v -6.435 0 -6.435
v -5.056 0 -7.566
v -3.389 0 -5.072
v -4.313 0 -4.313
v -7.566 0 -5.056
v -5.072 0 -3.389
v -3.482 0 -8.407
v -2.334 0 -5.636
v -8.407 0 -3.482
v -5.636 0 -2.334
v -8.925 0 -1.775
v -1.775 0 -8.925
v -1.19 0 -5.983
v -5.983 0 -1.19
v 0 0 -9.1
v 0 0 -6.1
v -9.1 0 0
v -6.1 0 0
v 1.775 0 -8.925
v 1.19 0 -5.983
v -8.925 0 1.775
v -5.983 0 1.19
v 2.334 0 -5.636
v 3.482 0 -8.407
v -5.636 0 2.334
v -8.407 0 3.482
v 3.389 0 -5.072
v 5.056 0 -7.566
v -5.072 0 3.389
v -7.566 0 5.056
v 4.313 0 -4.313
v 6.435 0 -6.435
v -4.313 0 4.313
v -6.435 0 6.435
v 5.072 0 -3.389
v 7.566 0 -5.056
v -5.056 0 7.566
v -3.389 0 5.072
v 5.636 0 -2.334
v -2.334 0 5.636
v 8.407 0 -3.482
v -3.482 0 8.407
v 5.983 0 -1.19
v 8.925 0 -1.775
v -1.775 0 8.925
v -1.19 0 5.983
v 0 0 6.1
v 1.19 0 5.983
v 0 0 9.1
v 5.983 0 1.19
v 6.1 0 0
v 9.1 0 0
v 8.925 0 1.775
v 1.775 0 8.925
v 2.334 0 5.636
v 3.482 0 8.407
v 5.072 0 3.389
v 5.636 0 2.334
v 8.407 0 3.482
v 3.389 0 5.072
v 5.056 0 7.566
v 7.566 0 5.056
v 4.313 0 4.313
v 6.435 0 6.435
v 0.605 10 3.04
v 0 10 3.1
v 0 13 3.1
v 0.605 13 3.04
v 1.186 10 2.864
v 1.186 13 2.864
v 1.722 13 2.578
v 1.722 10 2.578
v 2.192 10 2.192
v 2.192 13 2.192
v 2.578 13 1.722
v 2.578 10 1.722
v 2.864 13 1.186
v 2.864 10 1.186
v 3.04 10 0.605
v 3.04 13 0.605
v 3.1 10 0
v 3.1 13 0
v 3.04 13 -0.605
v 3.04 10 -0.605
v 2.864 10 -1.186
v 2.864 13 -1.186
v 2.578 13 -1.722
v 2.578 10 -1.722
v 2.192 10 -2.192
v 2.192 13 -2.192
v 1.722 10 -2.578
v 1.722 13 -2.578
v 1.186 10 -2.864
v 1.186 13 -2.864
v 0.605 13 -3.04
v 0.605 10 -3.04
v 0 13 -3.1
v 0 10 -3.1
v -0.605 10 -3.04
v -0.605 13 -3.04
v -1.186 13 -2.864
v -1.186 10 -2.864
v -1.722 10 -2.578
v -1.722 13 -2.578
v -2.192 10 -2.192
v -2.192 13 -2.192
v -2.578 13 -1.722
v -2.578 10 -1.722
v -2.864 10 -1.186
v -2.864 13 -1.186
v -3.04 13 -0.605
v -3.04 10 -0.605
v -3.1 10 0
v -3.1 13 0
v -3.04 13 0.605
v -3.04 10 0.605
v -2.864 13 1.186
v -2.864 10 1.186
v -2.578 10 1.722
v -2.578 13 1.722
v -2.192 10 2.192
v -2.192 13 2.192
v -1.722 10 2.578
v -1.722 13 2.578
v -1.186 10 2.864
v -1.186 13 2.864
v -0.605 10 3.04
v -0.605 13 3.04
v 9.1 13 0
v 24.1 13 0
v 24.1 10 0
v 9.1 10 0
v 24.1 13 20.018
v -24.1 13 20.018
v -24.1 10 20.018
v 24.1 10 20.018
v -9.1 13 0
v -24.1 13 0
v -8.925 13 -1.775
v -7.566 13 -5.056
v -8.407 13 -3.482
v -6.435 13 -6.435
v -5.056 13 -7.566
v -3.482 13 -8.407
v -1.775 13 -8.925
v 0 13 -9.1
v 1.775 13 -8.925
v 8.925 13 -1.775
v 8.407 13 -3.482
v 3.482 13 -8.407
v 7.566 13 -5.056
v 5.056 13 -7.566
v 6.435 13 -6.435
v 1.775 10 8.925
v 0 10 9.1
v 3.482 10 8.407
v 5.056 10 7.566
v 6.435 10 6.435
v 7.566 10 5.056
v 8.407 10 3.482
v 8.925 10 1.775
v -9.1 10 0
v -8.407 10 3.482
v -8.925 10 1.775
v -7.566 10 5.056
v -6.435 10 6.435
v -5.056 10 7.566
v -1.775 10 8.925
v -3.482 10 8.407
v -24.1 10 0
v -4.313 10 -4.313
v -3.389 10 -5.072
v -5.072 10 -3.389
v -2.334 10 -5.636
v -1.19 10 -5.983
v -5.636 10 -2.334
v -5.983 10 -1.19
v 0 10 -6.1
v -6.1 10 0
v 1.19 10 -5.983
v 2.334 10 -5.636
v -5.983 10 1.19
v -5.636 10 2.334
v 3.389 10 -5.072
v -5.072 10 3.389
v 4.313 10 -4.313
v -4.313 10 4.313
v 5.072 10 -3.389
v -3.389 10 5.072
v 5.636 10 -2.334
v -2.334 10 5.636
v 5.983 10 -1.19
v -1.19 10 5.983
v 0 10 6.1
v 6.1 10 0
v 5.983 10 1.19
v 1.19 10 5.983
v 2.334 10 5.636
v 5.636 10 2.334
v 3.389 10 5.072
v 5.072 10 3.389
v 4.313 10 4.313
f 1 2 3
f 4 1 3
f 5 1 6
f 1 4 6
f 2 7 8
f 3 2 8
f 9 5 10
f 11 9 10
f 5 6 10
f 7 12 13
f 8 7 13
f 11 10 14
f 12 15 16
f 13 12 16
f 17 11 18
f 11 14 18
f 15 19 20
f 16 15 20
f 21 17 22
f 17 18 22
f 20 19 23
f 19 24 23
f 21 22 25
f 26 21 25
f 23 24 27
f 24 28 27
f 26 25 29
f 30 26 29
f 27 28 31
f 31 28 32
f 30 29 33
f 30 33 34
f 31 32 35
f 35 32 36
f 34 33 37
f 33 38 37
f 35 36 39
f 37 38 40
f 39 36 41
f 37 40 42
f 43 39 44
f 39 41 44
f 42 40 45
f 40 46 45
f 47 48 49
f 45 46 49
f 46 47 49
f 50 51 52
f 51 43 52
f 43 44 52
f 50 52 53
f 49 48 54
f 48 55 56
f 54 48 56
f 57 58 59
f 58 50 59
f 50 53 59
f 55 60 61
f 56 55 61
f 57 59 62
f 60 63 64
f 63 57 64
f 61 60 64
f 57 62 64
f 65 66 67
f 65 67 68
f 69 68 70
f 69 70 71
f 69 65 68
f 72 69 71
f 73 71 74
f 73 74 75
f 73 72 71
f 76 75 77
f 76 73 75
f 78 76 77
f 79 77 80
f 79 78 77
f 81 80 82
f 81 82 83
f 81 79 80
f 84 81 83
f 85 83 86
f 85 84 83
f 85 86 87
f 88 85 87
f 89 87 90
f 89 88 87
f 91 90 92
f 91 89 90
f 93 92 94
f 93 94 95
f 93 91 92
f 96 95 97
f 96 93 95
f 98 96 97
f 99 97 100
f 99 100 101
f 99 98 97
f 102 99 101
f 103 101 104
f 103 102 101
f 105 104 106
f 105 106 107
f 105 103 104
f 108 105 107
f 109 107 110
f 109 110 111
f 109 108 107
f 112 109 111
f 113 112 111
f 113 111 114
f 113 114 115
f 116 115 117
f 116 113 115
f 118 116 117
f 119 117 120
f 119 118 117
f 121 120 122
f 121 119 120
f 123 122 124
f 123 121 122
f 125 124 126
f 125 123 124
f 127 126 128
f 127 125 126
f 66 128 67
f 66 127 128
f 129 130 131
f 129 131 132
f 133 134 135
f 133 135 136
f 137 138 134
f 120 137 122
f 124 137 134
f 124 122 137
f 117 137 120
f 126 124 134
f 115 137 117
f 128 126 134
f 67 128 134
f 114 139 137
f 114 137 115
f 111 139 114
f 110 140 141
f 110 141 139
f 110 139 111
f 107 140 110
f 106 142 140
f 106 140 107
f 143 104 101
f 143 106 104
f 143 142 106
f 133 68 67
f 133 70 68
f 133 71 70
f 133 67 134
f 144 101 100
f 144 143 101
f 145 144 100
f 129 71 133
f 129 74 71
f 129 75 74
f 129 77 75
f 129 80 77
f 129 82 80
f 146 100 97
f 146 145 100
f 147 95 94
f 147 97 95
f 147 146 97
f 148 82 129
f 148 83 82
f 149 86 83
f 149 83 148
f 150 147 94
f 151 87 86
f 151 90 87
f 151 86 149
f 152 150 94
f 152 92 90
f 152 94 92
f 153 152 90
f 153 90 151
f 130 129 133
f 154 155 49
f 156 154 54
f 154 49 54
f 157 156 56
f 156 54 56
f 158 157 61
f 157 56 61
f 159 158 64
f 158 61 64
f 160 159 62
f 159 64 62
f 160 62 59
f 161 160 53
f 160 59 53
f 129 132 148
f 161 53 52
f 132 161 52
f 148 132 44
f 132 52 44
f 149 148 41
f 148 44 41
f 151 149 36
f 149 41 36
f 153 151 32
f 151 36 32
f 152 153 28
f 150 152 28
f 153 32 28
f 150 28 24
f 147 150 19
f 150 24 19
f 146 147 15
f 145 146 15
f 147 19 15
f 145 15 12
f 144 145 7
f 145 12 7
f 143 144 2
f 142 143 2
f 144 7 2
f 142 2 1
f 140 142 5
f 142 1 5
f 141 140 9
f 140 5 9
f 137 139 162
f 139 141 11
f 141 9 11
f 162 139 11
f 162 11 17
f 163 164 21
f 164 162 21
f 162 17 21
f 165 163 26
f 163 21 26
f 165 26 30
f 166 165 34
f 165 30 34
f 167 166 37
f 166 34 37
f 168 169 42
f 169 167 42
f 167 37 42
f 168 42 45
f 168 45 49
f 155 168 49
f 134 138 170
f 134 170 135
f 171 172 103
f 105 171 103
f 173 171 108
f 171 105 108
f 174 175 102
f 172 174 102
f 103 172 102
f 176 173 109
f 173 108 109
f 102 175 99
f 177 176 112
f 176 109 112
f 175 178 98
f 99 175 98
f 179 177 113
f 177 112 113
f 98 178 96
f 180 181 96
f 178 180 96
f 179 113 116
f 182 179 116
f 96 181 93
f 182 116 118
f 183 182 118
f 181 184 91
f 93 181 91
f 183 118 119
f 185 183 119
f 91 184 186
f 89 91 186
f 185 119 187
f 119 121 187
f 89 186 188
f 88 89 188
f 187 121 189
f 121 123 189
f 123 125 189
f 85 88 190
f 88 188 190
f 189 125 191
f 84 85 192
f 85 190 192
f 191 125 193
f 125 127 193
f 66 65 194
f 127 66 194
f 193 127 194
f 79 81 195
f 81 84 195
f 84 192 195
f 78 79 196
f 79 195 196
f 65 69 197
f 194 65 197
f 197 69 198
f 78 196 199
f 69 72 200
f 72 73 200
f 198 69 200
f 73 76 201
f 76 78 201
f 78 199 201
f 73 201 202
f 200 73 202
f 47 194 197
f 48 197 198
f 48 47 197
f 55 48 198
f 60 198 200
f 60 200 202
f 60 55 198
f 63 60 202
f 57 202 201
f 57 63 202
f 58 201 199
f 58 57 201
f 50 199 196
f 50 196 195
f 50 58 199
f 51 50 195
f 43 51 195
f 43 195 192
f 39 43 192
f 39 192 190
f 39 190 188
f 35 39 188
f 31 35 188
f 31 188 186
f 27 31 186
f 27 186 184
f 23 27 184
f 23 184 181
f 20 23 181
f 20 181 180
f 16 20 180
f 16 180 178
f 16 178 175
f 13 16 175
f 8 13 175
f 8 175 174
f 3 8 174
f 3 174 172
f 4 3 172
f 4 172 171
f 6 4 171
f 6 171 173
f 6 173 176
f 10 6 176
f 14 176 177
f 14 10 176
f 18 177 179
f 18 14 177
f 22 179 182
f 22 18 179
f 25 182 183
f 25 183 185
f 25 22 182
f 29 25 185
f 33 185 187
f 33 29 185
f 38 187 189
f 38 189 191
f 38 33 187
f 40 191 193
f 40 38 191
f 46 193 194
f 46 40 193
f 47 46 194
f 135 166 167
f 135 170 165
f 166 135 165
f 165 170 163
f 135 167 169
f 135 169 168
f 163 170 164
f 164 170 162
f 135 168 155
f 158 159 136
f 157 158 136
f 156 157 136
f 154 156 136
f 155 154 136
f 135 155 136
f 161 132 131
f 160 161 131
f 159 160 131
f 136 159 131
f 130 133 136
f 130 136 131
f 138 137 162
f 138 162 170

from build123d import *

# Parameters (mm, degrees)
SKETCH1_R           = 9.1
SKETCH1_R_2         = 6.1
BOSS_EXTRUDE1_DEPTH = 10
SKETCH2_R           = 9.1
SKETCH2_R_2         = 3.1
BOSS_EXTRUDE2_DEPTH = 3
BOSS_EXTRUDE3_DEPTH = 3


with BuildPart() as part:
    # Sketch1 → Boss-Extrude1 (new body)
    with BuildSketch(Plane(origin=(0, 0, 0), x_dir=(1, 0, 0), z_dir=(0, 1, 0))):
        with Locations(Location((0, 0, 0), (0, 0, 270))):
            Circle(SKETCH1_R)
        with Locations(Location((0, 0, 0), (0, 0, 270))):
            Circle(SKETCH1_R_2, mode=Mode.SUBTRACT)
    extrude(amount=BOSS_EXTRUDE1_DEPTH)

    # Sketch2 → Boss-Extrude2 (add)
    with BuildSketch(Plane(origin=(0, 10, 0), x_dir=(1, 0, 0), z_dir=(0, 1, 0))):
        with Locations(Location((0, 0, 0), (0, 0, 270))):
            Circle(SKETCH2_R)
        with Locations(Location((0, 0, 0), (0, 0, 270))):
            Circle(SKETCH2_R_2, mode=Mode.SUBTRACT)
    extrude(amount=BOSS_EXTRUDE2_DEPTH)

    # Sketch3 → Boss-Extrude3 (add)
    with BuildSketch(Plane(origin=(0, 13, 0), x_dir=(1, 0, 0), z_dir=(0, 1, 0))):
        Polygon((-9.1, 0), (-24.1, 0), (-24.1, -20.018492189), (24.1, -20.018492189), (24.1, 0), (9.1, 0), (0, -6.029666322), align=None)
    extrude(amount=-BOSS_EXTRUDE3_DEPTH)


solid = part.part
